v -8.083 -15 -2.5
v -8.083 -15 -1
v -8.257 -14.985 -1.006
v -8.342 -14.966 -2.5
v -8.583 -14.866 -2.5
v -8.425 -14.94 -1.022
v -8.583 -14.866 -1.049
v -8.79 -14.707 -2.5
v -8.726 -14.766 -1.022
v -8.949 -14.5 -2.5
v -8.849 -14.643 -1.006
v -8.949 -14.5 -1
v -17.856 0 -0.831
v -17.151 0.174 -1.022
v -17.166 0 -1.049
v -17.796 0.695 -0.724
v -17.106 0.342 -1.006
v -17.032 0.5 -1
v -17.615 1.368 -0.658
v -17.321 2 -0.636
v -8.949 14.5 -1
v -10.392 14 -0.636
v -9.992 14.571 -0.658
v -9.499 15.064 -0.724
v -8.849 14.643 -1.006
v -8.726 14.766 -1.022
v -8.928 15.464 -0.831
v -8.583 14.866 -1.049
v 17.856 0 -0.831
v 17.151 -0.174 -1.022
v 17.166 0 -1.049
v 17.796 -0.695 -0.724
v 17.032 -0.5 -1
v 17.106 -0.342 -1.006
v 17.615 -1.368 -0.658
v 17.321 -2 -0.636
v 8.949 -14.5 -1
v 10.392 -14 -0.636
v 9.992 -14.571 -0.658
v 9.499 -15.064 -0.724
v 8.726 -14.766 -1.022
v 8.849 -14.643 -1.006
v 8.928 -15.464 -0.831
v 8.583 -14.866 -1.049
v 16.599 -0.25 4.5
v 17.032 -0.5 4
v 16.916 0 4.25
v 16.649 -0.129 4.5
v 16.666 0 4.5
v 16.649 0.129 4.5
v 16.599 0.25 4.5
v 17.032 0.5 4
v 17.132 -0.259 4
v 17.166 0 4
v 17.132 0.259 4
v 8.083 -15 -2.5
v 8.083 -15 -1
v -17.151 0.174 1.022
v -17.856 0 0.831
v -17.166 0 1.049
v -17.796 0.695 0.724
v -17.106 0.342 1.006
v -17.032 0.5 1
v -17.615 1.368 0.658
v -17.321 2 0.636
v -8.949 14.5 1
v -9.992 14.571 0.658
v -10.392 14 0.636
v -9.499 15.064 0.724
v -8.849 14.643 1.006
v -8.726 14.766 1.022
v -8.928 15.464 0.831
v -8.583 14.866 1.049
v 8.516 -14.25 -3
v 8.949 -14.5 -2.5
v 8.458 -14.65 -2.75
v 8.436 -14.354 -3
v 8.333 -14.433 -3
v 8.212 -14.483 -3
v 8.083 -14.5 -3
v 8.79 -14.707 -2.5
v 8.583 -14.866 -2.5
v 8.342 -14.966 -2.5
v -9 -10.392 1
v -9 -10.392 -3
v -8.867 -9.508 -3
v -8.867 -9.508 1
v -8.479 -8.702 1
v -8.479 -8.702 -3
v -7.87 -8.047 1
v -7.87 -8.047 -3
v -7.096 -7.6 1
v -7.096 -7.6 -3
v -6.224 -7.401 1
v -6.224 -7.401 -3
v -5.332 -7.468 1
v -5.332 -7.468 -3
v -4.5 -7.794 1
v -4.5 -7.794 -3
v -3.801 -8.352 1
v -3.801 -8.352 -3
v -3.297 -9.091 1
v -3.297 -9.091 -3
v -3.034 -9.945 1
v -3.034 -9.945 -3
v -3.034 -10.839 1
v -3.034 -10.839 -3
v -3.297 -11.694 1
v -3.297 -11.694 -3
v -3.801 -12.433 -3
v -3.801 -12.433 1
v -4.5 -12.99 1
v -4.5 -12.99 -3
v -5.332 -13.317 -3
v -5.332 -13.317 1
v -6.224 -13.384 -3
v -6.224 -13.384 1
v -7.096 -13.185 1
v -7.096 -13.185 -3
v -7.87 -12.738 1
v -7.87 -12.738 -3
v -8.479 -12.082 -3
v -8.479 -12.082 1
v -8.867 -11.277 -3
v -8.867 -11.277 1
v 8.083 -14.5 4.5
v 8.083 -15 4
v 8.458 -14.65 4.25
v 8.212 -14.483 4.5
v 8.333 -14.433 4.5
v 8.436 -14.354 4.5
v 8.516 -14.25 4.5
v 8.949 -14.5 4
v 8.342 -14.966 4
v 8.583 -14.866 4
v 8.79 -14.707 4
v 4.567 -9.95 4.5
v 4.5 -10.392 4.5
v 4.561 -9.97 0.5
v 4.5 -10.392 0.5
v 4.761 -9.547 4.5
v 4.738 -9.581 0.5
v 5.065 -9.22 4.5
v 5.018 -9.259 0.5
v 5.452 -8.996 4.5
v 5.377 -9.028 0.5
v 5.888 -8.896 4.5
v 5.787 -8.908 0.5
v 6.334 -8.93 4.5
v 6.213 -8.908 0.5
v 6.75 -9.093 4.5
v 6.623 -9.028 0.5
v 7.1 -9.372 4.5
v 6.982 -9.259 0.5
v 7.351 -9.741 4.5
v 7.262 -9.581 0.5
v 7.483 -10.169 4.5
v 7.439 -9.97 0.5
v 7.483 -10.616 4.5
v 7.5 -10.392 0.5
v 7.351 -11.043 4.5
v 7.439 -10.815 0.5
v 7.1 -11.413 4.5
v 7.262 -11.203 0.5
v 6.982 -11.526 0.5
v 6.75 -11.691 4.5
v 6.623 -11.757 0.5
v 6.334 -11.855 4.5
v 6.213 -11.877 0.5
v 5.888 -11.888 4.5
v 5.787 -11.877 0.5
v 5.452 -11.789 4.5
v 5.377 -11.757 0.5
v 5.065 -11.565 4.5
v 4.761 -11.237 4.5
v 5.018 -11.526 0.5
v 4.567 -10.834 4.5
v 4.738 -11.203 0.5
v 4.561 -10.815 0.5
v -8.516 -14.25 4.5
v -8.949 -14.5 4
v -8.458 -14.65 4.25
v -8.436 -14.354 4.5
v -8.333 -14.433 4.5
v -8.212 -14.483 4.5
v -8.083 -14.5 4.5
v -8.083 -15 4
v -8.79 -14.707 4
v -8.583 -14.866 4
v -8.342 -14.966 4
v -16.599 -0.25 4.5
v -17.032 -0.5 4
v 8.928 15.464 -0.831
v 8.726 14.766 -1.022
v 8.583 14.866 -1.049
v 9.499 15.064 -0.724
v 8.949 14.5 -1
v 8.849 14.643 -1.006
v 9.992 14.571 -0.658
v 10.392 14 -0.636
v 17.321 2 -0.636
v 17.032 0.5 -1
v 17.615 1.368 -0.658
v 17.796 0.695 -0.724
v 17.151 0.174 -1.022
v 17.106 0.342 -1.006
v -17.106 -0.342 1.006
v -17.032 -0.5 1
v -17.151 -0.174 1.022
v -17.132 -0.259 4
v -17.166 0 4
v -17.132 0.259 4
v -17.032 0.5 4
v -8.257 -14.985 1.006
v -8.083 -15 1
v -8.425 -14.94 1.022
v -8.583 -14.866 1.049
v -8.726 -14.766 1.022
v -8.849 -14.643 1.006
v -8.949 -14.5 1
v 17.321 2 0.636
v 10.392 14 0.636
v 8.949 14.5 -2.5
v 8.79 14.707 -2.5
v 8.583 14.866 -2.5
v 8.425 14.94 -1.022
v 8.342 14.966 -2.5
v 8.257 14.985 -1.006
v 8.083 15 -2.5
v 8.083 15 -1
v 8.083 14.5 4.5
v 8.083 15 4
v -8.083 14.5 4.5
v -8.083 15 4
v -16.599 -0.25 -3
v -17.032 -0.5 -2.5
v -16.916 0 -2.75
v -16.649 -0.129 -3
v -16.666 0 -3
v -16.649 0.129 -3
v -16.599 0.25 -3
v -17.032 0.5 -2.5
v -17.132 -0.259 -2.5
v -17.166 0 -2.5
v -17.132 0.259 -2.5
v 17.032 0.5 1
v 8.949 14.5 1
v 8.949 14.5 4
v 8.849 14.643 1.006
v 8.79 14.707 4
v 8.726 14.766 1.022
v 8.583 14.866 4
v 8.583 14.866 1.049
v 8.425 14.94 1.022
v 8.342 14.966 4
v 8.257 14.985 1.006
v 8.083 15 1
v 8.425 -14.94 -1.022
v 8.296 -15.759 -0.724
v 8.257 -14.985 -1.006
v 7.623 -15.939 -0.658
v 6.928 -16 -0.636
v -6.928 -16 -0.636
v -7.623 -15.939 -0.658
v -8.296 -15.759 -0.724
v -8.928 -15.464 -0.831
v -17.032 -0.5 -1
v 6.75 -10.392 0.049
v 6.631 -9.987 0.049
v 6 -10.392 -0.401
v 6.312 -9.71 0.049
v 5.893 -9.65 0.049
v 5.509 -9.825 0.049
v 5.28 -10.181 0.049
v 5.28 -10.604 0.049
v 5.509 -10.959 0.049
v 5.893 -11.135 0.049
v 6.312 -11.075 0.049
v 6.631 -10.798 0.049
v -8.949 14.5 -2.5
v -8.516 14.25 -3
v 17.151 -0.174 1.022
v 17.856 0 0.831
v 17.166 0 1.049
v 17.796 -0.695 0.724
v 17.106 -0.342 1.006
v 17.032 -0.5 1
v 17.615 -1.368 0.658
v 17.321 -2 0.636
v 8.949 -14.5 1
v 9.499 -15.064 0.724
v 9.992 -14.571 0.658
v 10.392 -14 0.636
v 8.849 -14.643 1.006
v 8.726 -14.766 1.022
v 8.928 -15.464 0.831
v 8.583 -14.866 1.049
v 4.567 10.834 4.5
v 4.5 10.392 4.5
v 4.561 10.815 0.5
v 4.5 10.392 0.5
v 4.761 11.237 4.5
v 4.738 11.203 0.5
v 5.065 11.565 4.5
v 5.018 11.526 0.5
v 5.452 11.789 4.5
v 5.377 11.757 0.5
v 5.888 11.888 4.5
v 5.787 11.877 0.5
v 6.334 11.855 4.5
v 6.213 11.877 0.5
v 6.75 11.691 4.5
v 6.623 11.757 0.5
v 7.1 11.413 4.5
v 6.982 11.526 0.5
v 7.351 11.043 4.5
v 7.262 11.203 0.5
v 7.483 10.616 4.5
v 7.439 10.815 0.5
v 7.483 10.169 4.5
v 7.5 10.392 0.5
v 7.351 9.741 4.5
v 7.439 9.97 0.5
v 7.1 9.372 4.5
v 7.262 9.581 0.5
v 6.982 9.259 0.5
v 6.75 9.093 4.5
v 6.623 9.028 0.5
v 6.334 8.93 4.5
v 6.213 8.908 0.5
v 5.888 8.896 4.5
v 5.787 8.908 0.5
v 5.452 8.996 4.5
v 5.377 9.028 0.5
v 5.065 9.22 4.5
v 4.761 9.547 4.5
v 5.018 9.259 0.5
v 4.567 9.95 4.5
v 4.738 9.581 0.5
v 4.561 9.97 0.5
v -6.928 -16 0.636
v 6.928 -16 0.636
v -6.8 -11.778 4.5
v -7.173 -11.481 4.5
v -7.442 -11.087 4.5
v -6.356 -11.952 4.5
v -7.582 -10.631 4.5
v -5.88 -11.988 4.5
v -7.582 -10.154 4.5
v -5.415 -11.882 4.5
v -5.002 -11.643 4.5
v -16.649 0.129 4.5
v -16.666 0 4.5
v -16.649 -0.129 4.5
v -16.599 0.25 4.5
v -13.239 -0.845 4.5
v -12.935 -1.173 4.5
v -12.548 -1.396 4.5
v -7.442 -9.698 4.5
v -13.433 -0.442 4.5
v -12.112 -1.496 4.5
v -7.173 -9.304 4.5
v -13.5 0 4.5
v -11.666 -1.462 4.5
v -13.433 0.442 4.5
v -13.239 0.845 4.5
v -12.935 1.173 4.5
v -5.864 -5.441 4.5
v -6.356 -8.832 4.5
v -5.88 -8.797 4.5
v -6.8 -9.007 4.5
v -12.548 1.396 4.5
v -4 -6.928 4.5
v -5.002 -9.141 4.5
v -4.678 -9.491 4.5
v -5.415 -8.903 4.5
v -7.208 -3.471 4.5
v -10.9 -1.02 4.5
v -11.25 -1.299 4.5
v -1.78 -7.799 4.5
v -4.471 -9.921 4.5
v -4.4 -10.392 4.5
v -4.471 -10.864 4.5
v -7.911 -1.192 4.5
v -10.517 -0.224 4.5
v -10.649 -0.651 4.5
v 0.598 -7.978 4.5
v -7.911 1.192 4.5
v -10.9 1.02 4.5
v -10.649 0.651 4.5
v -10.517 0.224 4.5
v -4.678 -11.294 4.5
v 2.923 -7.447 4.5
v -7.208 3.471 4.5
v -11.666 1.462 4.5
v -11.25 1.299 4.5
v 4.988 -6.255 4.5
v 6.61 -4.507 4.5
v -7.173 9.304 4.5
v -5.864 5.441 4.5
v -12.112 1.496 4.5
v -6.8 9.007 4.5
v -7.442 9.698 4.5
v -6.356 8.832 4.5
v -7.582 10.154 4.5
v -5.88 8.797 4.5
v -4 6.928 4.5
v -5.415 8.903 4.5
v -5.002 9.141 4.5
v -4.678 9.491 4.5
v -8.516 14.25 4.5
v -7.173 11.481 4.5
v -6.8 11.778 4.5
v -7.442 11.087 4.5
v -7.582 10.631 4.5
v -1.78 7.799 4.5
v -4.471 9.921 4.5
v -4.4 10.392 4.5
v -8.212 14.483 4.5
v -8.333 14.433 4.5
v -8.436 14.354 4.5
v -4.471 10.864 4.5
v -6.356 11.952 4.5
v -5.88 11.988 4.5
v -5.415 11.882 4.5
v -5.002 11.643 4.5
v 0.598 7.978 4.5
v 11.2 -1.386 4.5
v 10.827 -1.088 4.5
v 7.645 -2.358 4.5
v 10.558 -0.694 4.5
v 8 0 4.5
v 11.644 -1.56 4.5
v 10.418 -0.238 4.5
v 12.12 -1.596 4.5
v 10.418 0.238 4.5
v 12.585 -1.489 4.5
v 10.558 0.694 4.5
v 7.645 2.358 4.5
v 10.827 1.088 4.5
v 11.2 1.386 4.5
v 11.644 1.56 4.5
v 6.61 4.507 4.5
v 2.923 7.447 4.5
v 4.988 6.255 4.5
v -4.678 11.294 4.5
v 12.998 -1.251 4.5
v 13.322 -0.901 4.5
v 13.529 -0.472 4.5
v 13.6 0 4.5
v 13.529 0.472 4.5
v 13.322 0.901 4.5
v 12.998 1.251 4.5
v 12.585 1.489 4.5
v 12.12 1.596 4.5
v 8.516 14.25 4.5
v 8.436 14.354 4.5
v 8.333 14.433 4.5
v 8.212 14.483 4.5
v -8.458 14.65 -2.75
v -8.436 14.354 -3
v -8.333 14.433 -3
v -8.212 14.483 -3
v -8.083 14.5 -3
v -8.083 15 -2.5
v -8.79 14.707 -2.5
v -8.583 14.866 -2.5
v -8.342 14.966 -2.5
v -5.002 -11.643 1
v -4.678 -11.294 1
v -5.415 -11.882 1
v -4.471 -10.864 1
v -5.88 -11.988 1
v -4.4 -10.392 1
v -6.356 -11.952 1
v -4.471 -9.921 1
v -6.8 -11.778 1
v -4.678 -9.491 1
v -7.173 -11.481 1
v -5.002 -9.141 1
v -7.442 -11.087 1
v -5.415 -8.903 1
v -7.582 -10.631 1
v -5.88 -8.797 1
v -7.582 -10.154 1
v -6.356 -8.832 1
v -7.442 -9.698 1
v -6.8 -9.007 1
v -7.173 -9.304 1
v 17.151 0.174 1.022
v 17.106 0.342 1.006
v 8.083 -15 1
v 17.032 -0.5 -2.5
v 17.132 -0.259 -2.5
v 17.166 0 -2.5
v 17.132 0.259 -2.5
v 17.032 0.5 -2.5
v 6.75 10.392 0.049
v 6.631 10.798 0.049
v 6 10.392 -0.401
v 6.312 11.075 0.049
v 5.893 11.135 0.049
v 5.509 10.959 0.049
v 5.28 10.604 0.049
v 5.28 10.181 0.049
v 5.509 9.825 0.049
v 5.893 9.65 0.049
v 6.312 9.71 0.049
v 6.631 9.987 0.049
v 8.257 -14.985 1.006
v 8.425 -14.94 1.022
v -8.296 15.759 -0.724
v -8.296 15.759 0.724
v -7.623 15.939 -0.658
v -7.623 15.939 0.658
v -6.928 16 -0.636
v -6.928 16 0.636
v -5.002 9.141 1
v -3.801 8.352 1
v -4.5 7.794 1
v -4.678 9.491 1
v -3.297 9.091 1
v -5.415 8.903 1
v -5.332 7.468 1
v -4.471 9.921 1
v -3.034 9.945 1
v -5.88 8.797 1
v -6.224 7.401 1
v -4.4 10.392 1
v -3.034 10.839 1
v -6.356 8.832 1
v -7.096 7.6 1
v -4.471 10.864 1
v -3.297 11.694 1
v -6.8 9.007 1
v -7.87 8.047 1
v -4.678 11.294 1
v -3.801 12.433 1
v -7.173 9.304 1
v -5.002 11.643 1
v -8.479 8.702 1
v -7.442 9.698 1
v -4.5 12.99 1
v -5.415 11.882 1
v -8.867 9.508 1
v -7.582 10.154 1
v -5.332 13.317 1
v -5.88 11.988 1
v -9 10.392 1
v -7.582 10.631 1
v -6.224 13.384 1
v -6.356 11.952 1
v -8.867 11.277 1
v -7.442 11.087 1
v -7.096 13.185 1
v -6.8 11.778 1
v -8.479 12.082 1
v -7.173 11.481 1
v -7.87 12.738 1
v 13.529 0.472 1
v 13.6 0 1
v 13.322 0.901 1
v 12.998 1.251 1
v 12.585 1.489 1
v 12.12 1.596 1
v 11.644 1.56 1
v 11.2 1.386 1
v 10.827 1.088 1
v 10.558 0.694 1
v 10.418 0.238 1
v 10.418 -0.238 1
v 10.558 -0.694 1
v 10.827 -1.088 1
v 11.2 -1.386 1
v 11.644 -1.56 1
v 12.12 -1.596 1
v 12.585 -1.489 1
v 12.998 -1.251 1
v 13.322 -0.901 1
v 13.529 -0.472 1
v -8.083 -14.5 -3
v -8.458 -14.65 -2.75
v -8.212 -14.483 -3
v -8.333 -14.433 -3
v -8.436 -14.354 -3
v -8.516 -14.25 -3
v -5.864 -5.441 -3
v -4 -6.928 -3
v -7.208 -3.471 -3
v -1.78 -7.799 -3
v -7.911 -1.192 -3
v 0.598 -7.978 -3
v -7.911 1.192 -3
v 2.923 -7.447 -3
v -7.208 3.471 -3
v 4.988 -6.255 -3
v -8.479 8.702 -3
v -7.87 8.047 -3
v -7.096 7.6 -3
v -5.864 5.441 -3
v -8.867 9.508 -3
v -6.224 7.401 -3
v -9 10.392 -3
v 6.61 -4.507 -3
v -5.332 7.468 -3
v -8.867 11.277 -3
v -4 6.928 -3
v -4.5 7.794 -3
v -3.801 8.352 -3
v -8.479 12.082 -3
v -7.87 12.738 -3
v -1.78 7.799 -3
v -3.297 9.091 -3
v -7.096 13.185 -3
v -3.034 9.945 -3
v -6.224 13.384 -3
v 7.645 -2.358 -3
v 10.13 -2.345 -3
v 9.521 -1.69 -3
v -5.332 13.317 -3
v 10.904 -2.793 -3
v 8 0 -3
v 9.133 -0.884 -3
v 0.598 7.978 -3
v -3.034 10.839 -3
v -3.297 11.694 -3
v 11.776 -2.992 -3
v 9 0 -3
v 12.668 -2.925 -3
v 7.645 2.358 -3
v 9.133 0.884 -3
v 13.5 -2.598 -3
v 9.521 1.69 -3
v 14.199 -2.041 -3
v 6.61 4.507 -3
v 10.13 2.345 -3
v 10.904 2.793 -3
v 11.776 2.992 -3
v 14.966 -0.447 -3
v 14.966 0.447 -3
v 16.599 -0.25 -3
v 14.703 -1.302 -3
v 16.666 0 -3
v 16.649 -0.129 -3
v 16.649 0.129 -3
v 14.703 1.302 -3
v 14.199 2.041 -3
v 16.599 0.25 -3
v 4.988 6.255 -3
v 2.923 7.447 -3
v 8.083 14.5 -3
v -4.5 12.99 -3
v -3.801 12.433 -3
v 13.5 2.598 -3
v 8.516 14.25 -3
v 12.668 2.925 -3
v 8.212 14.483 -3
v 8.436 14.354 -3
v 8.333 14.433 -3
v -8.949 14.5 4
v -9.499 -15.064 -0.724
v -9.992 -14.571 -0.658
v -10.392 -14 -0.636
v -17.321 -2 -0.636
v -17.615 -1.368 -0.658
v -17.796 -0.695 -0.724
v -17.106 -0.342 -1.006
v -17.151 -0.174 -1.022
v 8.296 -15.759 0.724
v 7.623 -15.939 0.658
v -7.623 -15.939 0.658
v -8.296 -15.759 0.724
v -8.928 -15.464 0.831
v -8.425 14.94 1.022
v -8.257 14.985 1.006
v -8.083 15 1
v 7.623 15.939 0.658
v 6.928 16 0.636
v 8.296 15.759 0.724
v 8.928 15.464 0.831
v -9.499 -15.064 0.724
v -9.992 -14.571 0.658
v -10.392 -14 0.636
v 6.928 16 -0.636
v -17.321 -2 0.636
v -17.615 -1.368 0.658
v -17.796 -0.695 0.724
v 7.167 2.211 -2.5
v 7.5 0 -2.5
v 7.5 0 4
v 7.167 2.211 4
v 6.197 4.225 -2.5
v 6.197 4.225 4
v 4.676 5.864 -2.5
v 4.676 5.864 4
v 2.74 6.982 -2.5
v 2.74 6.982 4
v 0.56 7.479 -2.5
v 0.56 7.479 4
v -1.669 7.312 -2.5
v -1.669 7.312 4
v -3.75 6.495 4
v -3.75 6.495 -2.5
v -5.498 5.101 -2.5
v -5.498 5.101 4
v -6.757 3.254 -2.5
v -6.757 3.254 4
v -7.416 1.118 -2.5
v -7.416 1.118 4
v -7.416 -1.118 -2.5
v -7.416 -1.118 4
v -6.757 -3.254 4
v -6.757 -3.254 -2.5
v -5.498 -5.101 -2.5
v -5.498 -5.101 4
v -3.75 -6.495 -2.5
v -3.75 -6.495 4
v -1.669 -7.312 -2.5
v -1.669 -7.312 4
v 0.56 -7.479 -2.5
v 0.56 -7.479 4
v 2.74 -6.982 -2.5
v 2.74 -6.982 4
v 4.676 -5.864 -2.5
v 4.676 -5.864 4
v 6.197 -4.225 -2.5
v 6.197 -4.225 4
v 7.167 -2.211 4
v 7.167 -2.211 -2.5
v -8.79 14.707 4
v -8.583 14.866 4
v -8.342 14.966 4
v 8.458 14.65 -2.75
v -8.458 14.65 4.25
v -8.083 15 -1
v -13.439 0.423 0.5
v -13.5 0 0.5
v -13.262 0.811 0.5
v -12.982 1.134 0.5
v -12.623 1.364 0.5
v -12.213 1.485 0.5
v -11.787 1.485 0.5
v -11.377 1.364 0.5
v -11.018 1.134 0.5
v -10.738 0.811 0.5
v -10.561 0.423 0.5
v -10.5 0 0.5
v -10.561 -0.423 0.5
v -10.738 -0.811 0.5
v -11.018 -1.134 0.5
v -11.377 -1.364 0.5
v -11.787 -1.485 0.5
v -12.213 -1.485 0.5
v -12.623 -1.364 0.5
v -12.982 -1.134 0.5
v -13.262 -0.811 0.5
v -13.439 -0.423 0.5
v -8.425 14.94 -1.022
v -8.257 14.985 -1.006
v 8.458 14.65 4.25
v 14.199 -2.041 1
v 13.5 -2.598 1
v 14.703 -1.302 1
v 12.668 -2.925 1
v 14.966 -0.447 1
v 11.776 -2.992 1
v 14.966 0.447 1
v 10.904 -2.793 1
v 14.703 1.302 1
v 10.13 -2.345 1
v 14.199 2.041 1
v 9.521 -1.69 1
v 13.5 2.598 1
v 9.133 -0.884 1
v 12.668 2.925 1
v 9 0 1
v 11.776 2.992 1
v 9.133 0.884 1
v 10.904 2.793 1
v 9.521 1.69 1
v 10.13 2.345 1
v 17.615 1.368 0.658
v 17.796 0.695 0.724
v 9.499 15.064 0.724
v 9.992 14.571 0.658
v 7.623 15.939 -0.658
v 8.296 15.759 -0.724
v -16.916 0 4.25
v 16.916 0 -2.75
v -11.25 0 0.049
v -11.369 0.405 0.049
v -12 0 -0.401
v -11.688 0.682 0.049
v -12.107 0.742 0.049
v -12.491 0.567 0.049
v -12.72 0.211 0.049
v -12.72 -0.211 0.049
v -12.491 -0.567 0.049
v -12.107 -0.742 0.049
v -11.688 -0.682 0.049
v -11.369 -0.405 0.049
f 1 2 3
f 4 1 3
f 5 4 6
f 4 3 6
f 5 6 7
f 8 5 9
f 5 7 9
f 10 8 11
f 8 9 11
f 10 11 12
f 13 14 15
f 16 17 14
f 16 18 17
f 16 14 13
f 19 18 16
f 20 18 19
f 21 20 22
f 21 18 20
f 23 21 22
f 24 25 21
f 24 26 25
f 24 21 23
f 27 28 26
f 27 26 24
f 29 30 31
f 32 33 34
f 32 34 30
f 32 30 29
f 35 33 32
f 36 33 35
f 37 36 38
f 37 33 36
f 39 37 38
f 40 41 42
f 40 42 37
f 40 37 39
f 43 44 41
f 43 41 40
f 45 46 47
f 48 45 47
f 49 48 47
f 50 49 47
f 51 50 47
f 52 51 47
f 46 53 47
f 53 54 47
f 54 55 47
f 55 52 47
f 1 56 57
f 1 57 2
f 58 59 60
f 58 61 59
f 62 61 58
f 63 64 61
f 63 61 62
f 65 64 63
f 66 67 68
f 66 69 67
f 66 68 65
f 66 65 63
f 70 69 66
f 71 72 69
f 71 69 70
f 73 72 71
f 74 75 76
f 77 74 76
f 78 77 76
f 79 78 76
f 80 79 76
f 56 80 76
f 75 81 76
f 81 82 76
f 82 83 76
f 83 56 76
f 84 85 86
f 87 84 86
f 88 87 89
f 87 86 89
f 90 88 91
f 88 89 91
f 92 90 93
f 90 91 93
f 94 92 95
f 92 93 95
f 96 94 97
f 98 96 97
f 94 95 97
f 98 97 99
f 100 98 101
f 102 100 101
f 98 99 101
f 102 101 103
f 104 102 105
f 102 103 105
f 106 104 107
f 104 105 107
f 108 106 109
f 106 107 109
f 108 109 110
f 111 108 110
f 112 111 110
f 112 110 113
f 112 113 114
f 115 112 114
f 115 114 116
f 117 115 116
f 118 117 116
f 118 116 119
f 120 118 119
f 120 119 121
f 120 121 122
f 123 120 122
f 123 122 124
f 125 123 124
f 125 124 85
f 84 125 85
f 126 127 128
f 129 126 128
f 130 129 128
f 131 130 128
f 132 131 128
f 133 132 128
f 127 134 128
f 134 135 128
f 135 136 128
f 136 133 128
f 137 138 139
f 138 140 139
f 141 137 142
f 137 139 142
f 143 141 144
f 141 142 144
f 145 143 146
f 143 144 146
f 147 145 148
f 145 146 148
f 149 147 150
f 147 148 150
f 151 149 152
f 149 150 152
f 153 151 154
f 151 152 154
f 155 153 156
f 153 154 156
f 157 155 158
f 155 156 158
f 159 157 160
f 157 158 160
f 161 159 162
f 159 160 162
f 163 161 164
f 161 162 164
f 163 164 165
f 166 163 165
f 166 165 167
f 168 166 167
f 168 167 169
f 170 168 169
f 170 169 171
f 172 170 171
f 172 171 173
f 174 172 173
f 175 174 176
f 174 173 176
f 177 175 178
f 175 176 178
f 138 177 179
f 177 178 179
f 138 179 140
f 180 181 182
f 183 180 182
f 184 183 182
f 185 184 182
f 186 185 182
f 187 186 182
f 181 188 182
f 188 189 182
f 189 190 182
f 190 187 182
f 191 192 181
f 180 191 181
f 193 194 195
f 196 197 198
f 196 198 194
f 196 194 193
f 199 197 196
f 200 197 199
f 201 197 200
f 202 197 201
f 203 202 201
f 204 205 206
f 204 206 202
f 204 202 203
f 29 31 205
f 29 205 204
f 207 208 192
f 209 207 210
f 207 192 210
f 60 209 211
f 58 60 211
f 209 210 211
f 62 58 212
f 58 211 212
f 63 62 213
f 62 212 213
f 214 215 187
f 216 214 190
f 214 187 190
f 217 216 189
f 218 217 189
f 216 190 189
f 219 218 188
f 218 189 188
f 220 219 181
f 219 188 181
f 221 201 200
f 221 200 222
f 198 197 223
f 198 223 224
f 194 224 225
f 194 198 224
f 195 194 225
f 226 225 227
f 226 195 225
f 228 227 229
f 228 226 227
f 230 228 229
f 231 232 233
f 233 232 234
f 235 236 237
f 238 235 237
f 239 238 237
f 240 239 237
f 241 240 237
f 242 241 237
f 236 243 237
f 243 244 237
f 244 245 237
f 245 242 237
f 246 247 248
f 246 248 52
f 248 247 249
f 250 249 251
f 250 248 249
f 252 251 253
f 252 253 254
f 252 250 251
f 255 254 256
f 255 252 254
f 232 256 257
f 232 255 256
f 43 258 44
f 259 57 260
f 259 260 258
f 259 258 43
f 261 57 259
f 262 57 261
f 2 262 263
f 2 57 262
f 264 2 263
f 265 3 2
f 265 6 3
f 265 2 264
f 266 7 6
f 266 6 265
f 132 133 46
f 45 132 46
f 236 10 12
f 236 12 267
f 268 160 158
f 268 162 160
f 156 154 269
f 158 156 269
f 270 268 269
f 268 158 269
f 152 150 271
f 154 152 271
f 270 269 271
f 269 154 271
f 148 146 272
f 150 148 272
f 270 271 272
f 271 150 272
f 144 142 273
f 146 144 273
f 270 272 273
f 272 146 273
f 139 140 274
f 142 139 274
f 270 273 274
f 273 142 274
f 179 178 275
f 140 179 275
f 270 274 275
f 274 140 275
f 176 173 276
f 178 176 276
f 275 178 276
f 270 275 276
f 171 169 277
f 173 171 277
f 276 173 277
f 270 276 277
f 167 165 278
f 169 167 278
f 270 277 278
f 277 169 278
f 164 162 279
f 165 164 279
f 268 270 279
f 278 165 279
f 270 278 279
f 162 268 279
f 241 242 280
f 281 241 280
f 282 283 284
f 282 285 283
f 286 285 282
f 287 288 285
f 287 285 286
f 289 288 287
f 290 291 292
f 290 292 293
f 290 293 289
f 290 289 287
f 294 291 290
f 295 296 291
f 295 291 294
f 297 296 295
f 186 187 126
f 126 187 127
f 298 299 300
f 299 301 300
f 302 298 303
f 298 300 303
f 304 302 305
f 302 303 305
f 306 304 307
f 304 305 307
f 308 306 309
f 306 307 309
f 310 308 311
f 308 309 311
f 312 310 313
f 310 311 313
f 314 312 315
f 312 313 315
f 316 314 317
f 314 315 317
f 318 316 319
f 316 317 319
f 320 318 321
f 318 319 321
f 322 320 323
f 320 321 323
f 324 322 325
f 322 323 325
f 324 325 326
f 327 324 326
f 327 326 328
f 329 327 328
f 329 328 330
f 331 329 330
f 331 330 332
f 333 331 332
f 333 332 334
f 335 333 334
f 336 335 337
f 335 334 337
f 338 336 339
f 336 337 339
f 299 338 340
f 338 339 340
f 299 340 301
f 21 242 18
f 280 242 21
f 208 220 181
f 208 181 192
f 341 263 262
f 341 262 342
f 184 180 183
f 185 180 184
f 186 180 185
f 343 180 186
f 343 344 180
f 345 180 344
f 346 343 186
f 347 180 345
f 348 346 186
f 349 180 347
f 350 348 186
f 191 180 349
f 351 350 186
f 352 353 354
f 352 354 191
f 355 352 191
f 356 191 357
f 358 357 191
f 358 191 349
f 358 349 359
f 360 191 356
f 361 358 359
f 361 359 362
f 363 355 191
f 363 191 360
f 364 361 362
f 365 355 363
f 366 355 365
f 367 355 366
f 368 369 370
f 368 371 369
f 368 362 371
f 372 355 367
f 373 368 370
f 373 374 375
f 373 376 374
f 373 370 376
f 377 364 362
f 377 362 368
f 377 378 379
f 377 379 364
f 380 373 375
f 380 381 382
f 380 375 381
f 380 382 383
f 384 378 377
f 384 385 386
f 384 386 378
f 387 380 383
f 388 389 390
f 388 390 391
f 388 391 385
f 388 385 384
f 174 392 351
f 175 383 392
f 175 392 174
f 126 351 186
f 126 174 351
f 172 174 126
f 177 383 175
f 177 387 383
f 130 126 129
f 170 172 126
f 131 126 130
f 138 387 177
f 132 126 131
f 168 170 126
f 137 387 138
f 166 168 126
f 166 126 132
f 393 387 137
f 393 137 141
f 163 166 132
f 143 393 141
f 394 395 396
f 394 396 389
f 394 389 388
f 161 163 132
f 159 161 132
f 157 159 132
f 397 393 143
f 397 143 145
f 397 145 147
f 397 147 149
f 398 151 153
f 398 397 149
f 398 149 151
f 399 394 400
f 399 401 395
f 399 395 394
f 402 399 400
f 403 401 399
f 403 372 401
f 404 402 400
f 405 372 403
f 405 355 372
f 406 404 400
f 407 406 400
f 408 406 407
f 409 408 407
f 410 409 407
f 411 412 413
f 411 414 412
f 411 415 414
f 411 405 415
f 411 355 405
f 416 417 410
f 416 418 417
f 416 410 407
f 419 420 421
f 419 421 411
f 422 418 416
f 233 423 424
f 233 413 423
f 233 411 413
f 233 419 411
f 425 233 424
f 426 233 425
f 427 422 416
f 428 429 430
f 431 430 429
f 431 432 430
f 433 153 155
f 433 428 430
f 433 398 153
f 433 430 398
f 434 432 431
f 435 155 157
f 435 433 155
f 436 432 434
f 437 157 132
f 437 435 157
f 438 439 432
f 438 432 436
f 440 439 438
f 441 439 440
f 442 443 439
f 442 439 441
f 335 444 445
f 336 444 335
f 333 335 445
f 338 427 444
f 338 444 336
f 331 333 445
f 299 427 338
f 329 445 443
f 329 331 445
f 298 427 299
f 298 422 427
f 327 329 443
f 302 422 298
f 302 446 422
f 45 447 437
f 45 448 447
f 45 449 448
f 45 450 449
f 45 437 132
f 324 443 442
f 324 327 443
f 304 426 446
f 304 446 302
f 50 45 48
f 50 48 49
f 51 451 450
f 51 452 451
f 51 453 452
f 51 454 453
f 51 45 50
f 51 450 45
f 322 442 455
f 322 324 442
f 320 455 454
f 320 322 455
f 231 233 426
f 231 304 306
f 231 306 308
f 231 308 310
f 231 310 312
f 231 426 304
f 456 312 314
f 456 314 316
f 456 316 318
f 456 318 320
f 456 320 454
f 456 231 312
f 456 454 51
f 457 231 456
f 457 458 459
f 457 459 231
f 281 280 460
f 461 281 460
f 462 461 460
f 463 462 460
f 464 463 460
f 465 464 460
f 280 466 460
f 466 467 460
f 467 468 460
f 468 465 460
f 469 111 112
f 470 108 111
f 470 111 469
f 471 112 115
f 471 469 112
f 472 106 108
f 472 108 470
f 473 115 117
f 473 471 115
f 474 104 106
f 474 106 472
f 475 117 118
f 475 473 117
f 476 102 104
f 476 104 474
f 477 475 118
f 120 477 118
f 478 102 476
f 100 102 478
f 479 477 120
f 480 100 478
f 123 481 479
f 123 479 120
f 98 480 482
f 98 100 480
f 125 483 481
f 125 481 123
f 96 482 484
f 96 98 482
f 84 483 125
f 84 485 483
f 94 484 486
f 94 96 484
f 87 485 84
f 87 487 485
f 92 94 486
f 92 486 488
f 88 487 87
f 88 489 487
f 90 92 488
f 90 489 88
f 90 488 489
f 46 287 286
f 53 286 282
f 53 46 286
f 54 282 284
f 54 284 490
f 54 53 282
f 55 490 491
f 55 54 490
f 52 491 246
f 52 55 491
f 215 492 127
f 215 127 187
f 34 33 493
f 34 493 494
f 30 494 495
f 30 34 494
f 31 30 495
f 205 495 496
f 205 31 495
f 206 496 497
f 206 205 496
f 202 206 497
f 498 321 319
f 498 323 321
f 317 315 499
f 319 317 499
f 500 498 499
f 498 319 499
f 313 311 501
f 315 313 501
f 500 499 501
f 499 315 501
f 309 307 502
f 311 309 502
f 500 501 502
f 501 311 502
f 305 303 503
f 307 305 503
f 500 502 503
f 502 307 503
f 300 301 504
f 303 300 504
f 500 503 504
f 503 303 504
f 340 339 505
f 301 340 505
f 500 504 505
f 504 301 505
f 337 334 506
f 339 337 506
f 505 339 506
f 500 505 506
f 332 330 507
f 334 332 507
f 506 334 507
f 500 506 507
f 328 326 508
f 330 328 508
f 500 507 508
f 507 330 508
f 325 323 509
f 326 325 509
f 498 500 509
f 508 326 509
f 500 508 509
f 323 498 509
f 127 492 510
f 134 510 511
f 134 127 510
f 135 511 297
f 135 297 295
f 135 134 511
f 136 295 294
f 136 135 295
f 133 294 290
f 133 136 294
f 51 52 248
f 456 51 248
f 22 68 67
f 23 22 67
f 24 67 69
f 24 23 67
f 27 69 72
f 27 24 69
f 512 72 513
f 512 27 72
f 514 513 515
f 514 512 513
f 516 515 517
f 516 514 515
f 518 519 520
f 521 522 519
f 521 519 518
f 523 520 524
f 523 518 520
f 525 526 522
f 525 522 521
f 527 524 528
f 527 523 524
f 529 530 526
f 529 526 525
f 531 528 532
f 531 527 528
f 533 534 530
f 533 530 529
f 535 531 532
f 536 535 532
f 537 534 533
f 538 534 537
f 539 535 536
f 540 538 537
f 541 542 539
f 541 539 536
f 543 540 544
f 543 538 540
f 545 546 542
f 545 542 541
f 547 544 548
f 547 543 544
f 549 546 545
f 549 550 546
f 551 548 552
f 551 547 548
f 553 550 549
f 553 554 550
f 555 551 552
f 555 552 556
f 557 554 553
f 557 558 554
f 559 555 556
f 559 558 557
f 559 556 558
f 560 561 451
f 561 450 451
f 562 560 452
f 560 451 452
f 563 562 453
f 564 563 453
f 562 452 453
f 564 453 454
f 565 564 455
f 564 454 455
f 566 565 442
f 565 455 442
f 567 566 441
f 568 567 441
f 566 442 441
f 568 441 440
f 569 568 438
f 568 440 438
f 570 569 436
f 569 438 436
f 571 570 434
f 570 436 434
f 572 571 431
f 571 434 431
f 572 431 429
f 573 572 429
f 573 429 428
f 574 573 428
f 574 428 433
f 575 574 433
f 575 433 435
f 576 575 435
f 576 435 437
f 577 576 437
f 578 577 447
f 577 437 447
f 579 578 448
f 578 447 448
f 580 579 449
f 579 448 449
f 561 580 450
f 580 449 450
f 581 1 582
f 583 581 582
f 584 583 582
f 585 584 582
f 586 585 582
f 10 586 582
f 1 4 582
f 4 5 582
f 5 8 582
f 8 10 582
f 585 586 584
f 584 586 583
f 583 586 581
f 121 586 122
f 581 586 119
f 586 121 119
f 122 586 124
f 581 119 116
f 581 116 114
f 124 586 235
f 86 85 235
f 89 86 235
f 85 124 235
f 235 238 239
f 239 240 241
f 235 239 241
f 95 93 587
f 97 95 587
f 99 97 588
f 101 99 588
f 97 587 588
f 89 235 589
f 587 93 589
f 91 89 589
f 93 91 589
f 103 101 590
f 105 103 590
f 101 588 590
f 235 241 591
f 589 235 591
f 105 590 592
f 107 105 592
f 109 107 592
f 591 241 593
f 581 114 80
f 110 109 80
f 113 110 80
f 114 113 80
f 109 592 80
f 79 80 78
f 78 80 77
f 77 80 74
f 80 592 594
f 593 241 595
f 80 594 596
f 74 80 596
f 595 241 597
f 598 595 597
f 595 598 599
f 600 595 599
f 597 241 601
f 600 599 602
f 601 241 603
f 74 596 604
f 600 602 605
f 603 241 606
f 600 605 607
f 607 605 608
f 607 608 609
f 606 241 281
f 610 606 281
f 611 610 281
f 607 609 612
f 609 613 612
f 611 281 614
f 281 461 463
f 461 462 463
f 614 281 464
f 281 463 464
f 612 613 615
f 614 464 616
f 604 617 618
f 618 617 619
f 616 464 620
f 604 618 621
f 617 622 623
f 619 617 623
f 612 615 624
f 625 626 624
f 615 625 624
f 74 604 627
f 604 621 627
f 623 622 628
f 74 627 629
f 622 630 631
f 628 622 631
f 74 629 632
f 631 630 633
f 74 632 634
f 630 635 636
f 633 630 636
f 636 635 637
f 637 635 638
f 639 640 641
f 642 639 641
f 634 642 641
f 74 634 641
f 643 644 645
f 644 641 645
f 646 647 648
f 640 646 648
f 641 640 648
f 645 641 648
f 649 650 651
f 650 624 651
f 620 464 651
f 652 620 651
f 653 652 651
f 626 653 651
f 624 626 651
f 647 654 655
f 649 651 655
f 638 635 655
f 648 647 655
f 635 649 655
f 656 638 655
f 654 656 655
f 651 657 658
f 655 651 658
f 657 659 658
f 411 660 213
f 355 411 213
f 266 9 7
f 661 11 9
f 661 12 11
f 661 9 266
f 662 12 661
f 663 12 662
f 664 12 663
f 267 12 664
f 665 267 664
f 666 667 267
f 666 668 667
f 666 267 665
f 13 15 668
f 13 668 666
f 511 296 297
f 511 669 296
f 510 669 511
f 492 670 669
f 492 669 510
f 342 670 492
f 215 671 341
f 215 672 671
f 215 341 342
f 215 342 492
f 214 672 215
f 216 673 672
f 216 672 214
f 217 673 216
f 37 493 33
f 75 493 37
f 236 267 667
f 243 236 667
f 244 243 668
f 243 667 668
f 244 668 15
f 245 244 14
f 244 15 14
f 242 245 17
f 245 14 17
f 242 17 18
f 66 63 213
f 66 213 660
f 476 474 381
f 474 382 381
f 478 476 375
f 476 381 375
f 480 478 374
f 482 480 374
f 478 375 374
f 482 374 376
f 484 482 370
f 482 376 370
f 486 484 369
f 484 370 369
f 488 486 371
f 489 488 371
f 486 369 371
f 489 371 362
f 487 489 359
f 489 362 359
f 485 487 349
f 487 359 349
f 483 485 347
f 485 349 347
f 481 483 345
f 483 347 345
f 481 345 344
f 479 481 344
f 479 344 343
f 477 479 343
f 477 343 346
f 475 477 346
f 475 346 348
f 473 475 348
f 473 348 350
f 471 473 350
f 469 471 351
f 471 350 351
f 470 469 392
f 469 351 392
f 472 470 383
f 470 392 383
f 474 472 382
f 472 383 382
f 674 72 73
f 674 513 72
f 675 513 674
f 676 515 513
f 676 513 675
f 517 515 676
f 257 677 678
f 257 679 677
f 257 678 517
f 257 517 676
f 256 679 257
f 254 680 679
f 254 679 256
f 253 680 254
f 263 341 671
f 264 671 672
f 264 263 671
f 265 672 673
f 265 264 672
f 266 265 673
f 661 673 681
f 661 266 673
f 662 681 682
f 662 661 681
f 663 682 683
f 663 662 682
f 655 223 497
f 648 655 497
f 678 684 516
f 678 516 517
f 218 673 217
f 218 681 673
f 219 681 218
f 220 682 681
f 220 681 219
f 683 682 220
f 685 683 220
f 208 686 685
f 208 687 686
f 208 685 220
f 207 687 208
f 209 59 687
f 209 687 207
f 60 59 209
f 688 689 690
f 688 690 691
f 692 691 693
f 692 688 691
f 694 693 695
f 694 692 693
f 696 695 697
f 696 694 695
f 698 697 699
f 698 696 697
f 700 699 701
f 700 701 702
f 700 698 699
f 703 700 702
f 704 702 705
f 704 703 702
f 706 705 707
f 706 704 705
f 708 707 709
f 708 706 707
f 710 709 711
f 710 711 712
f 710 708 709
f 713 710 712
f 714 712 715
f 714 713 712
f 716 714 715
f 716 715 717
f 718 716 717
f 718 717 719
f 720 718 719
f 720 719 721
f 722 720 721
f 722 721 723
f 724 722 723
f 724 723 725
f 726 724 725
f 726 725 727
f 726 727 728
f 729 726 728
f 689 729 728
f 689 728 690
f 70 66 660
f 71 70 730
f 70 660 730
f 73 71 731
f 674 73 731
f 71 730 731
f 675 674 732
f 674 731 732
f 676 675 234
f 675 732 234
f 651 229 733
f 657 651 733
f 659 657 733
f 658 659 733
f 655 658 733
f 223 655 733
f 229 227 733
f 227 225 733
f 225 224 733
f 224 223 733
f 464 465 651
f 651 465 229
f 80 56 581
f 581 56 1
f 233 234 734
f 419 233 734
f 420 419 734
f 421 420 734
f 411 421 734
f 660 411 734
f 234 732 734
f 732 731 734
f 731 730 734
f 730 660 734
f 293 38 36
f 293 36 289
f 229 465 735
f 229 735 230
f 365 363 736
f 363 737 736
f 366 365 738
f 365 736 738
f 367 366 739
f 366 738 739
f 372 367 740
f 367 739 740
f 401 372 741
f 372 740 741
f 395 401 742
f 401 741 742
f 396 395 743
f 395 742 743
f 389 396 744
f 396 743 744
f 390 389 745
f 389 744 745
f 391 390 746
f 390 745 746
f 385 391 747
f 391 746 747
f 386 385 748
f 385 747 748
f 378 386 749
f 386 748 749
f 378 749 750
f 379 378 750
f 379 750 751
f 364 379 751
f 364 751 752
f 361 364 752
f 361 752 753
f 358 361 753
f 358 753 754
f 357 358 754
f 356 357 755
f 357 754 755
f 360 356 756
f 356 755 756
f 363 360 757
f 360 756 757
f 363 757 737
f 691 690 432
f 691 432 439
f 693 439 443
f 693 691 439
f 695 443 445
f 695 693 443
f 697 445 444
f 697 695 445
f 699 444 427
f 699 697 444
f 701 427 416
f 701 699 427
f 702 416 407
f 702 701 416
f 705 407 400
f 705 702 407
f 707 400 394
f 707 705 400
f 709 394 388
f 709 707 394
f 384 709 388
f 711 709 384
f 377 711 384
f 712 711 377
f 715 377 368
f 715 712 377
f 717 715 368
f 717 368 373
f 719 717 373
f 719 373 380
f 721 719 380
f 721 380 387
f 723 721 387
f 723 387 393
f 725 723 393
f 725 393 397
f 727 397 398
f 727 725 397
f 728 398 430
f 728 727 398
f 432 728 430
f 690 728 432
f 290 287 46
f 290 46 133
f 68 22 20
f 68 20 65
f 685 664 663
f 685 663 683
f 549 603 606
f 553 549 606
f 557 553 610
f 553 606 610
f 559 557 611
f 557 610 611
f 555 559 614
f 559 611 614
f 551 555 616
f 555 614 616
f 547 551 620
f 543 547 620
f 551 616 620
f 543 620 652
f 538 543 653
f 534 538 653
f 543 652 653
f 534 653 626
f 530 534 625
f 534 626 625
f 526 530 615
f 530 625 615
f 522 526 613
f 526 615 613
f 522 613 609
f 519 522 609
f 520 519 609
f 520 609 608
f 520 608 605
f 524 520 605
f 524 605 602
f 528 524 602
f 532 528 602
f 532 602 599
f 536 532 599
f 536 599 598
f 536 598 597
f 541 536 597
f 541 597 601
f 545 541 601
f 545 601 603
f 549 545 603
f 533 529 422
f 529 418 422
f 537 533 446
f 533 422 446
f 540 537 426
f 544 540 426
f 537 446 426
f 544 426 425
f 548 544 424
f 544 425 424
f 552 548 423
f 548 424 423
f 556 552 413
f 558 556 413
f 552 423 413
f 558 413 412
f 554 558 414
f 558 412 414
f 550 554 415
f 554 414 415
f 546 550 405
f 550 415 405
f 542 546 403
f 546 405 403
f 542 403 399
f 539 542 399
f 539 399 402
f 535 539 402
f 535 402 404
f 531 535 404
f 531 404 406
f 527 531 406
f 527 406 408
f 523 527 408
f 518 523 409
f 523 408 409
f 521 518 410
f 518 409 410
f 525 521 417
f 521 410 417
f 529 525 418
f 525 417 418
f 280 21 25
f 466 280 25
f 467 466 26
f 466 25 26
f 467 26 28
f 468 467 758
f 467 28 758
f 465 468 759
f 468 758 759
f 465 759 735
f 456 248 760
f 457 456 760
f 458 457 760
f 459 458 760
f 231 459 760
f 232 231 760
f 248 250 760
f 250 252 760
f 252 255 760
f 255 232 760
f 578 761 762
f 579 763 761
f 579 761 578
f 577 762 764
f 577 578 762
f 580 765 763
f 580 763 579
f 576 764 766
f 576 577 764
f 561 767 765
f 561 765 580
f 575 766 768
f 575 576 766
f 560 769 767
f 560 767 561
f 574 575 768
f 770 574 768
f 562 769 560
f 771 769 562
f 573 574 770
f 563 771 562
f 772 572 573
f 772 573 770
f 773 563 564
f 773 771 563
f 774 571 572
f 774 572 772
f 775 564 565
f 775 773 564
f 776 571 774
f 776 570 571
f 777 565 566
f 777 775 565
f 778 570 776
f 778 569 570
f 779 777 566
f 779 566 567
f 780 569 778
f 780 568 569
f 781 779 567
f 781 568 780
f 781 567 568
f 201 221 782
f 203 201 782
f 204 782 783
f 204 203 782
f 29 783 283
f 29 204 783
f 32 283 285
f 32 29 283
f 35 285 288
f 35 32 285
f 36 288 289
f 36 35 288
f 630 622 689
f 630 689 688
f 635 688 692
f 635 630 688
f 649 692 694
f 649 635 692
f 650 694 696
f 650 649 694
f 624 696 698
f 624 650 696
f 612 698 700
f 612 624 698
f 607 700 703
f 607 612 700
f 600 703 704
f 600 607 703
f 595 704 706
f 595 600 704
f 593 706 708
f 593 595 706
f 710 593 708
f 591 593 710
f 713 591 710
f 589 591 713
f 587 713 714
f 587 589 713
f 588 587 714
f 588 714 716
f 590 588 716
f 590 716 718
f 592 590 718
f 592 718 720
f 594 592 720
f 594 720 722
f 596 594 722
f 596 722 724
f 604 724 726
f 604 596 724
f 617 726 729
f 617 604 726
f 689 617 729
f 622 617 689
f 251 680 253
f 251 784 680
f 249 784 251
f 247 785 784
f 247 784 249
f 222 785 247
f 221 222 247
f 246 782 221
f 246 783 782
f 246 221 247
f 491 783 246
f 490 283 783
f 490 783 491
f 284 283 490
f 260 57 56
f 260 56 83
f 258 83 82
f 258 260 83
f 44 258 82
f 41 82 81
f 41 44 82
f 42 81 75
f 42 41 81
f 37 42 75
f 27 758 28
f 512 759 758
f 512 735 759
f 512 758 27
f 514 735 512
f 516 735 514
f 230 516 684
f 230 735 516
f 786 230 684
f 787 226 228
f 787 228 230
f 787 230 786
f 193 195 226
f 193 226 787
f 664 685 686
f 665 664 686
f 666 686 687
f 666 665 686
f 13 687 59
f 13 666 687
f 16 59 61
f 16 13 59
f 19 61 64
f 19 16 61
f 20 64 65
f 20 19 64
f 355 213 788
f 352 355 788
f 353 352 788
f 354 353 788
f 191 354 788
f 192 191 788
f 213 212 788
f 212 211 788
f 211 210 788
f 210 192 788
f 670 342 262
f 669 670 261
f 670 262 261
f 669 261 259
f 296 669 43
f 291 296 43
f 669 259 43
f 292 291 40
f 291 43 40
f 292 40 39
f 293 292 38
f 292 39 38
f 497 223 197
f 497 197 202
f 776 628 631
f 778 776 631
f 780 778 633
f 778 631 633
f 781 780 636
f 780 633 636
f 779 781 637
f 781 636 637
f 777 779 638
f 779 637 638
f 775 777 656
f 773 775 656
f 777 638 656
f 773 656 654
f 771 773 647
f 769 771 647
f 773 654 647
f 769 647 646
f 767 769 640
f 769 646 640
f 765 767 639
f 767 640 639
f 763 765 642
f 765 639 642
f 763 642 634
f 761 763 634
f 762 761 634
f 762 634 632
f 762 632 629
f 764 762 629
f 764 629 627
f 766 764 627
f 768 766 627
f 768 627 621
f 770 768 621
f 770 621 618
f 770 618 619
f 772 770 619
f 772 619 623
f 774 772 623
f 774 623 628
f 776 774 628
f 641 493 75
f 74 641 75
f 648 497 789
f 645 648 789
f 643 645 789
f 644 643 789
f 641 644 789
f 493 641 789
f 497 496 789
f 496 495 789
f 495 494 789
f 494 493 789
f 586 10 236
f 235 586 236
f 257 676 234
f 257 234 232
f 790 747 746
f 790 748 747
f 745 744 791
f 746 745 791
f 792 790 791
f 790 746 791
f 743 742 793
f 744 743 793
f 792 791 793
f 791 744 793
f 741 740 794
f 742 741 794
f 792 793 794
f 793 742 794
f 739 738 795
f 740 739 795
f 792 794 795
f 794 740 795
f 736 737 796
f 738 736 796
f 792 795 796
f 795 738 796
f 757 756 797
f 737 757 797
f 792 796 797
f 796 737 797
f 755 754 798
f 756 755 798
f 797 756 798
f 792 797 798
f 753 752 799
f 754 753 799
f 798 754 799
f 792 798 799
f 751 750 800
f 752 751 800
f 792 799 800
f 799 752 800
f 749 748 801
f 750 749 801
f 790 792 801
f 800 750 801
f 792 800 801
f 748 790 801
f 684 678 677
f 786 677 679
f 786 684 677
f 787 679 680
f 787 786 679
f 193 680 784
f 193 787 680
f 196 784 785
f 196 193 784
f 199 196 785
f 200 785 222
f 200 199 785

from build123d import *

# Parameters (mm, degrees)
SKETCH_1_W                   = 40
SKETCH_1_H                   = 40
SKETCH_1_R                   = 7.5
EXTRUDE_1_DEPTH              = 3
SKETCH_23_W                  = 40
SKETCH_23_H                  = 40
SKETCH_23_R                  = 7.5
EXTRUDE_4_DEPTH              = 1.5
HOLE_WIZARD_M3_1_D           = 3.2
HOLE_WIZARD_M3_1_CBORE_D     = 6
HOLE_WIZARD_M3_1_CBORE_DEPTH = 4
F_3_0MM_1_D                  = 3
F_3_0MM_1_DEPTH              = 4
F_3_0MM_1_TIP                = 0.901290929
SKETCH_26_OUTSIDE_W          = 53.412
SKETCH_26_OUTSIDE_H          = 53.412
CUT_EXTRUDE_1_DEPTH          = 30.261749777
FILLET_2_R                   = 4
FILLET_3_R                   = 1
CHAMFER_1_SIZE               = 0.5


with BuildPart() as part:
    # 草图1 → 凸台-拉伸1 (new, symmetric)
    with BuildSketch(Plane.XY):
        Rectangle(SKETCH_1_W, SKETCH_1_H)
        Circle(SKETCH_1_R, mode=Mode.SUBTRACT)
    extrude(amount=EXTRUDE_1_DEPTH, both=True)

    # 草图23 → 凸台-拉伸4 (add)
    with BuildSketch(Plane.XY.offset(3)):
        Rectangle(SKETCH_23_W, SKETCH_23_H)
        Circle(SKETCH_23_R, mode=Mode.SUBTRACT)
    extrude(amount=EXTRUDE_4_DEPTH)

    # M3 六角圆柱头螺钉的柱形沉头孔1 (through all)
    with Locations(Plane(origin=(0, 0, -3), x_dir=(-1, 0, 0), z_dir=(0, 0, -1))):
        with Locations((-12, 0), (6, 10.392304845), (6, -10.392304845)):
            CounterBoreHole(HOLE_WIZARD_M3_1_D / 2, HOLE_WIZARD_M3_1_CBORE_D / 2, HOLE_WIZARD_M3_1_CBORE_DEPTH)

    # Ø3.0mm 暗销孔1
    with Locations(Plane.XY.offset(4.5)):
        with Locations((-12, 0), (6, 10.392304845), (6, -10.392304845)):
            Hole(F_3_0MM_1_D / 2, depth=F_3_0MM_1_DEPTH)
            with Locations((0, 0, -(F_3_0MM_1_DEPTH + F_3_0MM_1_TIP / 2))):  # 118° drill point
                Cone(0, F_3_0MM_1_D / 2, F_3_0MM_1_TIP, mode=Mode.SUBTRACT)

    # 草图26 outside → 切除-拉伸1 (cut, through all)
    with BuildSketch(Plane(origin=(0, 0, -3), x_dir=(-1, 0, 0), z_dir=(0, 0, -1))):
        Rectangle(SKETCH_26_OUTSIDE_W, SKETCH_26_OUTSIDE_H)
        Polygon((-17.320508076, 0), (-8.660254038, -15), (8.660254038, -15), (17.320508076, 0), (8.660254038, 15), (-8.660254038, 15), align=None, mode=Mode.SUBTRACT)
    extrude(amount=-CUT_EXTRUDE_1_DEPTH, mode=Mode.SUBTRACT)

    # 扫描1: sweep along a path in 草图44
    with BuildLine(Plane(origin=(0, 0, -1), x_dir=(-1, 0, 0), z_dir=(0, 0, -1))) as sweep_1_path:
        Line((-17.320508076, 0), (-8.660254038, -15))
        Line((-8.660254038, -15), (8.660254038, -15))
        Line((8.660254038, -15), (17.320508076, 0))
        Line((17.320508076, 0), (8.660254038, 15))
        Line((8.660254038, 15), (-8.660254038, 15))
        Line((-8.660254038, 15), (-17.320508076, 0))
    # 草图43 → 扫描1 (sweep)
    with BuildSketch(Plane(origin=(0, 0, 0), x_dir=(0, 0, -1), z_dir=(1, 0, 0))):
        Polygon((-1, 15), (1, 15), (0.636029766, 16), (-0.636029766, 16), align=None)
    sweep(path=sweep_1_path.line, transition=Transition.RIGHT)

    # 圆角2
    fillet_2_edges = [part.edges().sort_by_distance(p)[0] for p in [
        (-18.475208614, 0, 0),
        (-9.237604307, 16, 0),
        (-9.237604307, -16, 0),
        (9.237604307, 16, 0),
        (9.237604307, -16, 0),
        (18.475208614, 0, 0),
    ]]
    fillet(fillet_2_edges, radius=FILLET_2_R)

    # 圆角3
    fillet_3_edges = [part.edges().sort_by_distance(p)[0] for p in [
        (17.320508076, 0, -2),
        (8.660254038, -15, -2),
        (-8.660254038, -15, -2),
        (-17.320508076, 0, -2),
        (-8.660254038, 15, -2),
        (8.660254038, 15, -2),
        (8.660254038, 15, 2.75),
        (-8.660254038, 15, 2.75),
        (-17.320508076, 0, 2.75),
        (-8.660254038, -15, 2.75),
        (8.660254038, -15, 2.75),
        (17.320508076, 0, 2.75),
    ]]
    fillet(fillet_3_edges, radius=FILLET_3_R)

    # 倒角1
    chamfer_1_edges = [part.edges().sort_by_distance(p)[0] for p in [
        (-7.5, 0, -3),
        (-12.990381057, 7.5, -3),
        (12.990381057, 7.5, -3),
        (12.990381057, -7.5, -3),
        (0, -15, -3),
        (-12.990381057, -7.5, -3),
        (-7.5, 0, 4.5),
        (0, 15, -3),
        (8.582903769, 14.866025404, -3),
        (17.165807537, 0, -3),
        (8.582903769, -14.866025404, -3),
        (-8.582903769, -14.866025404, -3),
        (-17.165807537, 0, -3),
        (-8.582903769, 14.866025404, -3),
        (-12.990381057, 7.5, 4.5),
        (0, 15, 4.5),
        (12.990381057, -7.5, 4.5),
        (12.990381057, 7.5, 4.5),
        (-12.990381057, -7.5, 4.5),
        (0, -15, 4.5),
        (8.582903769, 14.866025404, 4.5),
        (17.165807537, 0, 4.5),
        (8.582903769, -14.866025404, 4.5),
        (-8.582903769, -14.866025404, 4.5),
        (-17.165807537, 0, 4.5),
        (-8.582903769, 14.866025404, 4.5),
    ]]
    chamfer(chamfer_1_edges, length=CHAMFER_1_SIZE)


solid = part.part
